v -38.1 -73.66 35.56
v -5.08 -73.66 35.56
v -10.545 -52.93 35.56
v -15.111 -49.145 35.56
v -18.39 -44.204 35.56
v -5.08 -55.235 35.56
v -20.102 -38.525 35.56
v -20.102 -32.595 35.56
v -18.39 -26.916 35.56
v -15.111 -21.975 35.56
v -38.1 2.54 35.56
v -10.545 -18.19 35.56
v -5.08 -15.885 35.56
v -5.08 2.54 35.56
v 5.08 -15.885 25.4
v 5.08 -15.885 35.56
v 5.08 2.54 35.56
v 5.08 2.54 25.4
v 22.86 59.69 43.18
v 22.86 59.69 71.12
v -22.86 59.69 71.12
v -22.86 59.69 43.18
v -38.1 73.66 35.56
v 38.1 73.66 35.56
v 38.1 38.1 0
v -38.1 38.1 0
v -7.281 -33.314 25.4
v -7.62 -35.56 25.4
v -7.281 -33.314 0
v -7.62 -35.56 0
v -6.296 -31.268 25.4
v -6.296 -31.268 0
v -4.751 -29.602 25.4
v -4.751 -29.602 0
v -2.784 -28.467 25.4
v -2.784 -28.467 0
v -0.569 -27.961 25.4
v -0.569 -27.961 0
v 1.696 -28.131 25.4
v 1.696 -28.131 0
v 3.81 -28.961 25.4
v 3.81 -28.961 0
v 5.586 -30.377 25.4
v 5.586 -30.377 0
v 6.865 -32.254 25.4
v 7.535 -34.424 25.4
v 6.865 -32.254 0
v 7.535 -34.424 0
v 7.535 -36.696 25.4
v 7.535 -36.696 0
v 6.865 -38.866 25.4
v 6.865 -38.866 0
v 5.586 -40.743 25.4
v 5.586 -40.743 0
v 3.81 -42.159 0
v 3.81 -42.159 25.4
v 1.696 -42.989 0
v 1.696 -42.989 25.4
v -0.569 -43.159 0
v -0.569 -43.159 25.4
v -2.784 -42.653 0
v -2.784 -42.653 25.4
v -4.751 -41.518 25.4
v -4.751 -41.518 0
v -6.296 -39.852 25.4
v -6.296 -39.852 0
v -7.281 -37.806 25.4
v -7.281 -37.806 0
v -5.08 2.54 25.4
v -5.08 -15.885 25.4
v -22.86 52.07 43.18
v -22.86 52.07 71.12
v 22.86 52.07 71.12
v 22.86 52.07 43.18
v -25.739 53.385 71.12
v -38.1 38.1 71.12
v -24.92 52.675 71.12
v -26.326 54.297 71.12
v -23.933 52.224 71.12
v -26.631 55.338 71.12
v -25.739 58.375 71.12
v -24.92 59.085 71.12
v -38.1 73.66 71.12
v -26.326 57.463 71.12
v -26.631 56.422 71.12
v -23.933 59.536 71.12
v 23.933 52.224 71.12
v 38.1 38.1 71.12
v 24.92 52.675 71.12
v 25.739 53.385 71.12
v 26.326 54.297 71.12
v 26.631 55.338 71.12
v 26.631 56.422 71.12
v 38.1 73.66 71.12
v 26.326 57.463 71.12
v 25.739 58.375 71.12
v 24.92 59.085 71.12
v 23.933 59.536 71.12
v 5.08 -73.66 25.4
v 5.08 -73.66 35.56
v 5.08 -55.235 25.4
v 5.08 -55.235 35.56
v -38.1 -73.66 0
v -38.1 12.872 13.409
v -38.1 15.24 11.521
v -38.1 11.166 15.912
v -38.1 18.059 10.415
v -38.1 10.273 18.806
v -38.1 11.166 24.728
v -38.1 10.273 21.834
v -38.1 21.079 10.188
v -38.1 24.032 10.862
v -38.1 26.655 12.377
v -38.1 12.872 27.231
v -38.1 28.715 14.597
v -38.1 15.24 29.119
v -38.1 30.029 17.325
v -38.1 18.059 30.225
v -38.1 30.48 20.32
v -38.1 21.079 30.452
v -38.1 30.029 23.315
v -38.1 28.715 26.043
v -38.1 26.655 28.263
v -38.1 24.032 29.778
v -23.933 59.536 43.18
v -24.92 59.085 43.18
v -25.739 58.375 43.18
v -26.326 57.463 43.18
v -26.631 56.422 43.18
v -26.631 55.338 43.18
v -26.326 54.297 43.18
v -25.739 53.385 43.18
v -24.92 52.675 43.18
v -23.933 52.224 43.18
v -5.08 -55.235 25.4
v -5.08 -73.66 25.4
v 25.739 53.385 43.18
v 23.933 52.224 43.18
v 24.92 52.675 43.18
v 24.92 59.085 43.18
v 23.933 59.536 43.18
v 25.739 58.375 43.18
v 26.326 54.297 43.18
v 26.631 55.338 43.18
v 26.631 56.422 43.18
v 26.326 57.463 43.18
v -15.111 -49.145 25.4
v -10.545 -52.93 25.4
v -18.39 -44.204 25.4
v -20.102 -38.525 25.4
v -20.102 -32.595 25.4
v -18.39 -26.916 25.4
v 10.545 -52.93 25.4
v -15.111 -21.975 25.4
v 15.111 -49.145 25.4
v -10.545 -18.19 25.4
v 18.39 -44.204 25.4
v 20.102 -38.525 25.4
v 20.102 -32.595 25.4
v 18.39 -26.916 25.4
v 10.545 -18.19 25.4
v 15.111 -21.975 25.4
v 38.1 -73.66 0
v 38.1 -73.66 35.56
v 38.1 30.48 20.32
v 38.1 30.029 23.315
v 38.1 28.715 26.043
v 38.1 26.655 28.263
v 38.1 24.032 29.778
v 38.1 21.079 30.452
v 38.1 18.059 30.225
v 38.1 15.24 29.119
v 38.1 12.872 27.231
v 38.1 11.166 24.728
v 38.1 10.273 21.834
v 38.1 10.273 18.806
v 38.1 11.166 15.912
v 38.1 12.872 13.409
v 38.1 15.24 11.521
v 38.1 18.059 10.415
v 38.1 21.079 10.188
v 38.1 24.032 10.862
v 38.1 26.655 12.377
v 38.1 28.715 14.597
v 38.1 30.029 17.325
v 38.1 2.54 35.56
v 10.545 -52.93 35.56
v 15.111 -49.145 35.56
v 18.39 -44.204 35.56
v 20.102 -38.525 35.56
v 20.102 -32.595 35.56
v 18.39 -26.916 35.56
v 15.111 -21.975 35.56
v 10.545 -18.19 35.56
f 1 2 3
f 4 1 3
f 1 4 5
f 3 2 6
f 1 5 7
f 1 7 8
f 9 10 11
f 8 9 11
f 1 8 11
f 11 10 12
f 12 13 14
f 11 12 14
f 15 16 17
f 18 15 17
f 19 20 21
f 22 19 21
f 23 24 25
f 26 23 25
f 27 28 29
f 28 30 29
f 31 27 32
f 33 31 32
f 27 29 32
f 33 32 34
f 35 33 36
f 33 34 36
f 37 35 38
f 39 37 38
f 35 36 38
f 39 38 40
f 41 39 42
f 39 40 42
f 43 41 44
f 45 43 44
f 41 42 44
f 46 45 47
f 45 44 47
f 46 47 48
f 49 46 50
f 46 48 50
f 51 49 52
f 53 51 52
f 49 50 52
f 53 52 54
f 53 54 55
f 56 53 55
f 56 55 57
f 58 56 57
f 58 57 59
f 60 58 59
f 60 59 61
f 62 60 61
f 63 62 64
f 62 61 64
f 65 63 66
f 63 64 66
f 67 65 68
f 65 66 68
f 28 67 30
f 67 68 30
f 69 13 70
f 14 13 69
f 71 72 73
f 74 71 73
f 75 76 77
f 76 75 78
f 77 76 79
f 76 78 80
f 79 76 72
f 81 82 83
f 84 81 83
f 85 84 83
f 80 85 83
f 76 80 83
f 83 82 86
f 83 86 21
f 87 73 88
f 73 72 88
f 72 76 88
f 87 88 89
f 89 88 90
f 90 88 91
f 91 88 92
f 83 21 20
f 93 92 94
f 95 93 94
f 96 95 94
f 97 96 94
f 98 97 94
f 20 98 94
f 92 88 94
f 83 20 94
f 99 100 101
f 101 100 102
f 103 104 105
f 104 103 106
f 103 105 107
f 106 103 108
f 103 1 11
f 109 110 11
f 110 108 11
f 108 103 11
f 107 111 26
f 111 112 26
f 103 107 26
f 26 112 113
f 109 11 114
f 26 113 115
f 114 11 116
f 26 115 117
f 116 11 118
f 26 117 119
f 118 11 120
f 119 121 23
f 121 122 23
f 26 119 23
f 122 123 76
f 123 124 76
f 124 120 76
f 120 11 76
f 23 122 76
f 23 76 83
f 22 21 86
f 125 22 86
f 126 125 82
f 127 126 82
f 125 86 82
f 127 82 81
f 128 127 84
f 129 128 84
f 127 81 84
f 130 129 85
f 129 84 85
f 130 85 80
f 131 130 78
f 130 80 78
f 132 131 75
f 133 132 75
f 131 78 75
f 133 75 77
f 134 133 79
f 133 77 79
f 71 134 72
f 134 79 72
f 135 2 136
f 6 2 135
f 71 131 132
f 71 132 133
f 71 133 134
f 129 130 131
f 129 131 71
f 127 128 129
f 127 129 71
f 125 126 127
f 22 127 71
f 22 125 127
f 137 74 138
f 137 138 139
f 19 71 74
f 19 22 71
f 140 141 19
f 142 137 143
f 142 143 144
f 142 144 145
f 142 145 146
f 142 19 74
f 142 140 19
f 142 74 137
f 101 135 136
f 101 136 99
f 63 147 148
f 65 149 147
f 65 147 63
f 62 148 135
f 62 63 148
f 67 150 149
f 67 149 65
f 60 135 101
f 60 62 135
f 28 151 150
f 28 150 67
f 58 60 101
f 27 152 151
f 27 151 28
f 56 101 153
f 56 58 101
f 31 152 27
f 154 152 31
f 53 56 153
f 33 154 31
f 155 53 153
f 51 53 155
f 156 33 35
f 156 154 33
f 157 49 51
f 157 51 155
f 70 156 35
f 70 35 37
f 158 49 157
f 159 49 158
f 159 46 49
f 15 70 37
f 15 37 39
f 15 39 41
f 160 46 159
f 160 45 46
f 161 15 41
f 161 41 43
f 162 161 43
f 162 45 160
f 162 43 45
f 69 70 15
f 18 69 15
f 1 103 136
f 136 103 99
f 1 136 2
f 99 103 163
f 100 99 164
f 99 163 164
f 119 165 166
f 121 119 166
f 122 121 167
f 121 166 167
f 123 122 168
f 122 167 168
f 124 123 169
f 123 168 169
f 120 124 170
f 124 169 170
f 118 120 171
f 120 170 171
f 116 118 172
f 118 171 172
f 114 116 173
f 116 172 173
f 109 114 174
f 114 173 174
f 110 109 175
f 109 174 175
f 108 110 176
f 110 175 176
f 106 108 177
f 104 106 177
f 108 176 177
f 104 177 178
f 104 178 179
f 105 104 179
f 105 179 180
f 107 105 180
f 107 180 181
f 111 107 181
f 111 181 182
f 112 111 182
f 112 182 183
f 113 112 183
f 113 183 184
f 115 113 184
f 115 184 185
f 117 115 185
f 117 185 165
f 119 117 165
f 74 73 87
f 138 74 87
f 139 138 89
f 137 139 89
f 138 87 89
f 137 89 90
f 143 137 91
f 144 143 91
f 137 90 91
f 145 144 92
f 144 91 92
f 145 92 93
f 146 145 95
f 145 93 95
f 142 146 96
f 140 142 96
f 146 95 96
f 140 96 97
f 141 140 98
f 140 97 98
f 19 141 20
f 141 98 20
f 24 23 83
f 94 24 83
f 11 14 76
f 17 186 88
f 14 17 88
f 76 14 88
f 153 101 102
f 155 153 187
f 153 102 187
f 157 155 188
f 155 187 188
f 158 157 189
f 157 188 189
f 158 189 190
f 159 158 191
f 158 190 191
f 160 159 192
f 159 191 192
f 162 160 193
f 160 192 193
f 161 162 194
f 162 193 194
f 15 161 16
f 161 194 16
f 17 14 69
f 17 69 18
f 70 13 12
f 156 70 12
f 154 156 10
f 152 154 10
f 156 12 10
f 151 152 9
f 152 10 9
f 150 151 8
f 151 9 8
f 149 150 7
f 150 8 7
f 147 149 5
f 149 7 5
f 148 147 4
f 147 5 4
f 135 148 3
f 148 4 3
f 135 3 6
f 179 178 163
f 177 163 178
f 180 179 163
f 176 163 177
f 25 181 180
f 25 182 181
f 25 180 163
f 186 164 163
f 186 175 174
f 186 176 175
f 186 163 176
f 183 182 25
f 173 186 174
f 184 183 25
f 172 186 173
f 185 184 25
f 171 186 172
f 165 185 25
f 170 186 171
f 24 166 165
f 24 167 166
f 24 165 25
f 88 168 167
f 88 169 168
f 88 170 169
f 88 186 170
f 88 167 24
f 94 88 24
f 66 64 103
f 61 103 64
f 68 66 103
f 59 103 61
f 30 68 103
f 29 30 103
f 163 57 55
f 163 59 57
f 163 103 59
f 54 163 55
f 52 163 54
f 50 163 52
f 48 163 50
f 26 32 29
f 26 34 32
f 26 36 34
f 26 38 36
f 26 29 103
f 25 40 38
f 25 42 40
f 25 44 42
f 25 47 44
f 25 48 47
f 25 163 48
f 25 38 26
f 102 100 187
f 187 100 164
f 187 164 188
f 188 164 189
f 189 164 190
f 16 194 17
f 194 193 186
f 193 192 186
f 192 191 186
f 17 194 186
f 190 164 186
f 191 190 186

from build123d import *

# Parameters (mm, degrees)
F0_W           = 147.32
F0_H           = 71.12
F1_DEPTH       = 38.1
F3_DEPTH       = 76.201
F4_R           = 10.16
F5_DEPTH       = 76.201
F6_W           = 10.16
F6_H           = 76.2
F7_DEPTH       = 10.16
F8_D           = 15.24
F8_CBORE_D     = 40.64
F8_CBORE_DEPTH = 10.16
F10_DEPTH      = 27.94


with BuildPart() as f1:
    # F0 (on Right) → F1 (new body, symmetric)
    with BuildSketch(Plane.YZ):
        with Locations((0, 35.56)):
            Rectangle(F0_W, F0_H)
    extrude(amount=F1_DEPTH, both=True)

    # F2 (on face) → F3 (cut, through all)
    with BuildSketch(Plane.YZ.offset(38.1)):
        Polygon((2.54, 35.56), (38.1, 71.12), (-73.66, 71.12), (-73.66, 35.56), align=None)
        Polygon((73.66, 35.56), (38.1, 0), (73.66, 0), align=None)
    extrude(amount=-F3_DEPTH, mode=Mode.SUBTRACT)

    # F4 (on face) → F5 (cut, through all)
    with BuildSketch(Plane.YZ.offset(38.1)):
        with Locations((20.32, 20.32)):
            Circle(F4_R)
    extrude(amount=-F5_DEPTH, mode=Mode.SUBTRACT)

    # F6 (on face) → F7 (cut)
    with BuildSketch(Plane.XY.offset(35.56)):
        with Locations((0, -35.56)):
            Rectangle(F6_W, F6_H)
    extrude(amount=-F7_DEPTH, mode=Mode.SUBTRACT)

    # F8 (through all)
    with Locations(Plane.XY.offset(35.56)):
        with Locations((0, -35.56)):
            CounterBoreHole(F8_D / 2, F8_CBORE_D / 2, F8_CBORE_DEPTH)

    # F9 (on face) → F10 (cut)
    with BuildSketch(Plane.XY.offset(71.12)):
        with BuildLine():
            Line((22.86, 59.69), (-22.86, 59.69))
            ThreePointArc((-22.86, 59.69), (-26.67, 55.88), (-22.86, 52.07))
            Line((-22.86, 52.07), (22.86, 52.07))
            ThreePointArc((22.86, 52.07), (26.67, 55.88), (22.86, 59.69))
        make_face()
    extrude(amount=-F10_DEPTH, mode=Mode.SUBTRACT)


solid = f1.part
